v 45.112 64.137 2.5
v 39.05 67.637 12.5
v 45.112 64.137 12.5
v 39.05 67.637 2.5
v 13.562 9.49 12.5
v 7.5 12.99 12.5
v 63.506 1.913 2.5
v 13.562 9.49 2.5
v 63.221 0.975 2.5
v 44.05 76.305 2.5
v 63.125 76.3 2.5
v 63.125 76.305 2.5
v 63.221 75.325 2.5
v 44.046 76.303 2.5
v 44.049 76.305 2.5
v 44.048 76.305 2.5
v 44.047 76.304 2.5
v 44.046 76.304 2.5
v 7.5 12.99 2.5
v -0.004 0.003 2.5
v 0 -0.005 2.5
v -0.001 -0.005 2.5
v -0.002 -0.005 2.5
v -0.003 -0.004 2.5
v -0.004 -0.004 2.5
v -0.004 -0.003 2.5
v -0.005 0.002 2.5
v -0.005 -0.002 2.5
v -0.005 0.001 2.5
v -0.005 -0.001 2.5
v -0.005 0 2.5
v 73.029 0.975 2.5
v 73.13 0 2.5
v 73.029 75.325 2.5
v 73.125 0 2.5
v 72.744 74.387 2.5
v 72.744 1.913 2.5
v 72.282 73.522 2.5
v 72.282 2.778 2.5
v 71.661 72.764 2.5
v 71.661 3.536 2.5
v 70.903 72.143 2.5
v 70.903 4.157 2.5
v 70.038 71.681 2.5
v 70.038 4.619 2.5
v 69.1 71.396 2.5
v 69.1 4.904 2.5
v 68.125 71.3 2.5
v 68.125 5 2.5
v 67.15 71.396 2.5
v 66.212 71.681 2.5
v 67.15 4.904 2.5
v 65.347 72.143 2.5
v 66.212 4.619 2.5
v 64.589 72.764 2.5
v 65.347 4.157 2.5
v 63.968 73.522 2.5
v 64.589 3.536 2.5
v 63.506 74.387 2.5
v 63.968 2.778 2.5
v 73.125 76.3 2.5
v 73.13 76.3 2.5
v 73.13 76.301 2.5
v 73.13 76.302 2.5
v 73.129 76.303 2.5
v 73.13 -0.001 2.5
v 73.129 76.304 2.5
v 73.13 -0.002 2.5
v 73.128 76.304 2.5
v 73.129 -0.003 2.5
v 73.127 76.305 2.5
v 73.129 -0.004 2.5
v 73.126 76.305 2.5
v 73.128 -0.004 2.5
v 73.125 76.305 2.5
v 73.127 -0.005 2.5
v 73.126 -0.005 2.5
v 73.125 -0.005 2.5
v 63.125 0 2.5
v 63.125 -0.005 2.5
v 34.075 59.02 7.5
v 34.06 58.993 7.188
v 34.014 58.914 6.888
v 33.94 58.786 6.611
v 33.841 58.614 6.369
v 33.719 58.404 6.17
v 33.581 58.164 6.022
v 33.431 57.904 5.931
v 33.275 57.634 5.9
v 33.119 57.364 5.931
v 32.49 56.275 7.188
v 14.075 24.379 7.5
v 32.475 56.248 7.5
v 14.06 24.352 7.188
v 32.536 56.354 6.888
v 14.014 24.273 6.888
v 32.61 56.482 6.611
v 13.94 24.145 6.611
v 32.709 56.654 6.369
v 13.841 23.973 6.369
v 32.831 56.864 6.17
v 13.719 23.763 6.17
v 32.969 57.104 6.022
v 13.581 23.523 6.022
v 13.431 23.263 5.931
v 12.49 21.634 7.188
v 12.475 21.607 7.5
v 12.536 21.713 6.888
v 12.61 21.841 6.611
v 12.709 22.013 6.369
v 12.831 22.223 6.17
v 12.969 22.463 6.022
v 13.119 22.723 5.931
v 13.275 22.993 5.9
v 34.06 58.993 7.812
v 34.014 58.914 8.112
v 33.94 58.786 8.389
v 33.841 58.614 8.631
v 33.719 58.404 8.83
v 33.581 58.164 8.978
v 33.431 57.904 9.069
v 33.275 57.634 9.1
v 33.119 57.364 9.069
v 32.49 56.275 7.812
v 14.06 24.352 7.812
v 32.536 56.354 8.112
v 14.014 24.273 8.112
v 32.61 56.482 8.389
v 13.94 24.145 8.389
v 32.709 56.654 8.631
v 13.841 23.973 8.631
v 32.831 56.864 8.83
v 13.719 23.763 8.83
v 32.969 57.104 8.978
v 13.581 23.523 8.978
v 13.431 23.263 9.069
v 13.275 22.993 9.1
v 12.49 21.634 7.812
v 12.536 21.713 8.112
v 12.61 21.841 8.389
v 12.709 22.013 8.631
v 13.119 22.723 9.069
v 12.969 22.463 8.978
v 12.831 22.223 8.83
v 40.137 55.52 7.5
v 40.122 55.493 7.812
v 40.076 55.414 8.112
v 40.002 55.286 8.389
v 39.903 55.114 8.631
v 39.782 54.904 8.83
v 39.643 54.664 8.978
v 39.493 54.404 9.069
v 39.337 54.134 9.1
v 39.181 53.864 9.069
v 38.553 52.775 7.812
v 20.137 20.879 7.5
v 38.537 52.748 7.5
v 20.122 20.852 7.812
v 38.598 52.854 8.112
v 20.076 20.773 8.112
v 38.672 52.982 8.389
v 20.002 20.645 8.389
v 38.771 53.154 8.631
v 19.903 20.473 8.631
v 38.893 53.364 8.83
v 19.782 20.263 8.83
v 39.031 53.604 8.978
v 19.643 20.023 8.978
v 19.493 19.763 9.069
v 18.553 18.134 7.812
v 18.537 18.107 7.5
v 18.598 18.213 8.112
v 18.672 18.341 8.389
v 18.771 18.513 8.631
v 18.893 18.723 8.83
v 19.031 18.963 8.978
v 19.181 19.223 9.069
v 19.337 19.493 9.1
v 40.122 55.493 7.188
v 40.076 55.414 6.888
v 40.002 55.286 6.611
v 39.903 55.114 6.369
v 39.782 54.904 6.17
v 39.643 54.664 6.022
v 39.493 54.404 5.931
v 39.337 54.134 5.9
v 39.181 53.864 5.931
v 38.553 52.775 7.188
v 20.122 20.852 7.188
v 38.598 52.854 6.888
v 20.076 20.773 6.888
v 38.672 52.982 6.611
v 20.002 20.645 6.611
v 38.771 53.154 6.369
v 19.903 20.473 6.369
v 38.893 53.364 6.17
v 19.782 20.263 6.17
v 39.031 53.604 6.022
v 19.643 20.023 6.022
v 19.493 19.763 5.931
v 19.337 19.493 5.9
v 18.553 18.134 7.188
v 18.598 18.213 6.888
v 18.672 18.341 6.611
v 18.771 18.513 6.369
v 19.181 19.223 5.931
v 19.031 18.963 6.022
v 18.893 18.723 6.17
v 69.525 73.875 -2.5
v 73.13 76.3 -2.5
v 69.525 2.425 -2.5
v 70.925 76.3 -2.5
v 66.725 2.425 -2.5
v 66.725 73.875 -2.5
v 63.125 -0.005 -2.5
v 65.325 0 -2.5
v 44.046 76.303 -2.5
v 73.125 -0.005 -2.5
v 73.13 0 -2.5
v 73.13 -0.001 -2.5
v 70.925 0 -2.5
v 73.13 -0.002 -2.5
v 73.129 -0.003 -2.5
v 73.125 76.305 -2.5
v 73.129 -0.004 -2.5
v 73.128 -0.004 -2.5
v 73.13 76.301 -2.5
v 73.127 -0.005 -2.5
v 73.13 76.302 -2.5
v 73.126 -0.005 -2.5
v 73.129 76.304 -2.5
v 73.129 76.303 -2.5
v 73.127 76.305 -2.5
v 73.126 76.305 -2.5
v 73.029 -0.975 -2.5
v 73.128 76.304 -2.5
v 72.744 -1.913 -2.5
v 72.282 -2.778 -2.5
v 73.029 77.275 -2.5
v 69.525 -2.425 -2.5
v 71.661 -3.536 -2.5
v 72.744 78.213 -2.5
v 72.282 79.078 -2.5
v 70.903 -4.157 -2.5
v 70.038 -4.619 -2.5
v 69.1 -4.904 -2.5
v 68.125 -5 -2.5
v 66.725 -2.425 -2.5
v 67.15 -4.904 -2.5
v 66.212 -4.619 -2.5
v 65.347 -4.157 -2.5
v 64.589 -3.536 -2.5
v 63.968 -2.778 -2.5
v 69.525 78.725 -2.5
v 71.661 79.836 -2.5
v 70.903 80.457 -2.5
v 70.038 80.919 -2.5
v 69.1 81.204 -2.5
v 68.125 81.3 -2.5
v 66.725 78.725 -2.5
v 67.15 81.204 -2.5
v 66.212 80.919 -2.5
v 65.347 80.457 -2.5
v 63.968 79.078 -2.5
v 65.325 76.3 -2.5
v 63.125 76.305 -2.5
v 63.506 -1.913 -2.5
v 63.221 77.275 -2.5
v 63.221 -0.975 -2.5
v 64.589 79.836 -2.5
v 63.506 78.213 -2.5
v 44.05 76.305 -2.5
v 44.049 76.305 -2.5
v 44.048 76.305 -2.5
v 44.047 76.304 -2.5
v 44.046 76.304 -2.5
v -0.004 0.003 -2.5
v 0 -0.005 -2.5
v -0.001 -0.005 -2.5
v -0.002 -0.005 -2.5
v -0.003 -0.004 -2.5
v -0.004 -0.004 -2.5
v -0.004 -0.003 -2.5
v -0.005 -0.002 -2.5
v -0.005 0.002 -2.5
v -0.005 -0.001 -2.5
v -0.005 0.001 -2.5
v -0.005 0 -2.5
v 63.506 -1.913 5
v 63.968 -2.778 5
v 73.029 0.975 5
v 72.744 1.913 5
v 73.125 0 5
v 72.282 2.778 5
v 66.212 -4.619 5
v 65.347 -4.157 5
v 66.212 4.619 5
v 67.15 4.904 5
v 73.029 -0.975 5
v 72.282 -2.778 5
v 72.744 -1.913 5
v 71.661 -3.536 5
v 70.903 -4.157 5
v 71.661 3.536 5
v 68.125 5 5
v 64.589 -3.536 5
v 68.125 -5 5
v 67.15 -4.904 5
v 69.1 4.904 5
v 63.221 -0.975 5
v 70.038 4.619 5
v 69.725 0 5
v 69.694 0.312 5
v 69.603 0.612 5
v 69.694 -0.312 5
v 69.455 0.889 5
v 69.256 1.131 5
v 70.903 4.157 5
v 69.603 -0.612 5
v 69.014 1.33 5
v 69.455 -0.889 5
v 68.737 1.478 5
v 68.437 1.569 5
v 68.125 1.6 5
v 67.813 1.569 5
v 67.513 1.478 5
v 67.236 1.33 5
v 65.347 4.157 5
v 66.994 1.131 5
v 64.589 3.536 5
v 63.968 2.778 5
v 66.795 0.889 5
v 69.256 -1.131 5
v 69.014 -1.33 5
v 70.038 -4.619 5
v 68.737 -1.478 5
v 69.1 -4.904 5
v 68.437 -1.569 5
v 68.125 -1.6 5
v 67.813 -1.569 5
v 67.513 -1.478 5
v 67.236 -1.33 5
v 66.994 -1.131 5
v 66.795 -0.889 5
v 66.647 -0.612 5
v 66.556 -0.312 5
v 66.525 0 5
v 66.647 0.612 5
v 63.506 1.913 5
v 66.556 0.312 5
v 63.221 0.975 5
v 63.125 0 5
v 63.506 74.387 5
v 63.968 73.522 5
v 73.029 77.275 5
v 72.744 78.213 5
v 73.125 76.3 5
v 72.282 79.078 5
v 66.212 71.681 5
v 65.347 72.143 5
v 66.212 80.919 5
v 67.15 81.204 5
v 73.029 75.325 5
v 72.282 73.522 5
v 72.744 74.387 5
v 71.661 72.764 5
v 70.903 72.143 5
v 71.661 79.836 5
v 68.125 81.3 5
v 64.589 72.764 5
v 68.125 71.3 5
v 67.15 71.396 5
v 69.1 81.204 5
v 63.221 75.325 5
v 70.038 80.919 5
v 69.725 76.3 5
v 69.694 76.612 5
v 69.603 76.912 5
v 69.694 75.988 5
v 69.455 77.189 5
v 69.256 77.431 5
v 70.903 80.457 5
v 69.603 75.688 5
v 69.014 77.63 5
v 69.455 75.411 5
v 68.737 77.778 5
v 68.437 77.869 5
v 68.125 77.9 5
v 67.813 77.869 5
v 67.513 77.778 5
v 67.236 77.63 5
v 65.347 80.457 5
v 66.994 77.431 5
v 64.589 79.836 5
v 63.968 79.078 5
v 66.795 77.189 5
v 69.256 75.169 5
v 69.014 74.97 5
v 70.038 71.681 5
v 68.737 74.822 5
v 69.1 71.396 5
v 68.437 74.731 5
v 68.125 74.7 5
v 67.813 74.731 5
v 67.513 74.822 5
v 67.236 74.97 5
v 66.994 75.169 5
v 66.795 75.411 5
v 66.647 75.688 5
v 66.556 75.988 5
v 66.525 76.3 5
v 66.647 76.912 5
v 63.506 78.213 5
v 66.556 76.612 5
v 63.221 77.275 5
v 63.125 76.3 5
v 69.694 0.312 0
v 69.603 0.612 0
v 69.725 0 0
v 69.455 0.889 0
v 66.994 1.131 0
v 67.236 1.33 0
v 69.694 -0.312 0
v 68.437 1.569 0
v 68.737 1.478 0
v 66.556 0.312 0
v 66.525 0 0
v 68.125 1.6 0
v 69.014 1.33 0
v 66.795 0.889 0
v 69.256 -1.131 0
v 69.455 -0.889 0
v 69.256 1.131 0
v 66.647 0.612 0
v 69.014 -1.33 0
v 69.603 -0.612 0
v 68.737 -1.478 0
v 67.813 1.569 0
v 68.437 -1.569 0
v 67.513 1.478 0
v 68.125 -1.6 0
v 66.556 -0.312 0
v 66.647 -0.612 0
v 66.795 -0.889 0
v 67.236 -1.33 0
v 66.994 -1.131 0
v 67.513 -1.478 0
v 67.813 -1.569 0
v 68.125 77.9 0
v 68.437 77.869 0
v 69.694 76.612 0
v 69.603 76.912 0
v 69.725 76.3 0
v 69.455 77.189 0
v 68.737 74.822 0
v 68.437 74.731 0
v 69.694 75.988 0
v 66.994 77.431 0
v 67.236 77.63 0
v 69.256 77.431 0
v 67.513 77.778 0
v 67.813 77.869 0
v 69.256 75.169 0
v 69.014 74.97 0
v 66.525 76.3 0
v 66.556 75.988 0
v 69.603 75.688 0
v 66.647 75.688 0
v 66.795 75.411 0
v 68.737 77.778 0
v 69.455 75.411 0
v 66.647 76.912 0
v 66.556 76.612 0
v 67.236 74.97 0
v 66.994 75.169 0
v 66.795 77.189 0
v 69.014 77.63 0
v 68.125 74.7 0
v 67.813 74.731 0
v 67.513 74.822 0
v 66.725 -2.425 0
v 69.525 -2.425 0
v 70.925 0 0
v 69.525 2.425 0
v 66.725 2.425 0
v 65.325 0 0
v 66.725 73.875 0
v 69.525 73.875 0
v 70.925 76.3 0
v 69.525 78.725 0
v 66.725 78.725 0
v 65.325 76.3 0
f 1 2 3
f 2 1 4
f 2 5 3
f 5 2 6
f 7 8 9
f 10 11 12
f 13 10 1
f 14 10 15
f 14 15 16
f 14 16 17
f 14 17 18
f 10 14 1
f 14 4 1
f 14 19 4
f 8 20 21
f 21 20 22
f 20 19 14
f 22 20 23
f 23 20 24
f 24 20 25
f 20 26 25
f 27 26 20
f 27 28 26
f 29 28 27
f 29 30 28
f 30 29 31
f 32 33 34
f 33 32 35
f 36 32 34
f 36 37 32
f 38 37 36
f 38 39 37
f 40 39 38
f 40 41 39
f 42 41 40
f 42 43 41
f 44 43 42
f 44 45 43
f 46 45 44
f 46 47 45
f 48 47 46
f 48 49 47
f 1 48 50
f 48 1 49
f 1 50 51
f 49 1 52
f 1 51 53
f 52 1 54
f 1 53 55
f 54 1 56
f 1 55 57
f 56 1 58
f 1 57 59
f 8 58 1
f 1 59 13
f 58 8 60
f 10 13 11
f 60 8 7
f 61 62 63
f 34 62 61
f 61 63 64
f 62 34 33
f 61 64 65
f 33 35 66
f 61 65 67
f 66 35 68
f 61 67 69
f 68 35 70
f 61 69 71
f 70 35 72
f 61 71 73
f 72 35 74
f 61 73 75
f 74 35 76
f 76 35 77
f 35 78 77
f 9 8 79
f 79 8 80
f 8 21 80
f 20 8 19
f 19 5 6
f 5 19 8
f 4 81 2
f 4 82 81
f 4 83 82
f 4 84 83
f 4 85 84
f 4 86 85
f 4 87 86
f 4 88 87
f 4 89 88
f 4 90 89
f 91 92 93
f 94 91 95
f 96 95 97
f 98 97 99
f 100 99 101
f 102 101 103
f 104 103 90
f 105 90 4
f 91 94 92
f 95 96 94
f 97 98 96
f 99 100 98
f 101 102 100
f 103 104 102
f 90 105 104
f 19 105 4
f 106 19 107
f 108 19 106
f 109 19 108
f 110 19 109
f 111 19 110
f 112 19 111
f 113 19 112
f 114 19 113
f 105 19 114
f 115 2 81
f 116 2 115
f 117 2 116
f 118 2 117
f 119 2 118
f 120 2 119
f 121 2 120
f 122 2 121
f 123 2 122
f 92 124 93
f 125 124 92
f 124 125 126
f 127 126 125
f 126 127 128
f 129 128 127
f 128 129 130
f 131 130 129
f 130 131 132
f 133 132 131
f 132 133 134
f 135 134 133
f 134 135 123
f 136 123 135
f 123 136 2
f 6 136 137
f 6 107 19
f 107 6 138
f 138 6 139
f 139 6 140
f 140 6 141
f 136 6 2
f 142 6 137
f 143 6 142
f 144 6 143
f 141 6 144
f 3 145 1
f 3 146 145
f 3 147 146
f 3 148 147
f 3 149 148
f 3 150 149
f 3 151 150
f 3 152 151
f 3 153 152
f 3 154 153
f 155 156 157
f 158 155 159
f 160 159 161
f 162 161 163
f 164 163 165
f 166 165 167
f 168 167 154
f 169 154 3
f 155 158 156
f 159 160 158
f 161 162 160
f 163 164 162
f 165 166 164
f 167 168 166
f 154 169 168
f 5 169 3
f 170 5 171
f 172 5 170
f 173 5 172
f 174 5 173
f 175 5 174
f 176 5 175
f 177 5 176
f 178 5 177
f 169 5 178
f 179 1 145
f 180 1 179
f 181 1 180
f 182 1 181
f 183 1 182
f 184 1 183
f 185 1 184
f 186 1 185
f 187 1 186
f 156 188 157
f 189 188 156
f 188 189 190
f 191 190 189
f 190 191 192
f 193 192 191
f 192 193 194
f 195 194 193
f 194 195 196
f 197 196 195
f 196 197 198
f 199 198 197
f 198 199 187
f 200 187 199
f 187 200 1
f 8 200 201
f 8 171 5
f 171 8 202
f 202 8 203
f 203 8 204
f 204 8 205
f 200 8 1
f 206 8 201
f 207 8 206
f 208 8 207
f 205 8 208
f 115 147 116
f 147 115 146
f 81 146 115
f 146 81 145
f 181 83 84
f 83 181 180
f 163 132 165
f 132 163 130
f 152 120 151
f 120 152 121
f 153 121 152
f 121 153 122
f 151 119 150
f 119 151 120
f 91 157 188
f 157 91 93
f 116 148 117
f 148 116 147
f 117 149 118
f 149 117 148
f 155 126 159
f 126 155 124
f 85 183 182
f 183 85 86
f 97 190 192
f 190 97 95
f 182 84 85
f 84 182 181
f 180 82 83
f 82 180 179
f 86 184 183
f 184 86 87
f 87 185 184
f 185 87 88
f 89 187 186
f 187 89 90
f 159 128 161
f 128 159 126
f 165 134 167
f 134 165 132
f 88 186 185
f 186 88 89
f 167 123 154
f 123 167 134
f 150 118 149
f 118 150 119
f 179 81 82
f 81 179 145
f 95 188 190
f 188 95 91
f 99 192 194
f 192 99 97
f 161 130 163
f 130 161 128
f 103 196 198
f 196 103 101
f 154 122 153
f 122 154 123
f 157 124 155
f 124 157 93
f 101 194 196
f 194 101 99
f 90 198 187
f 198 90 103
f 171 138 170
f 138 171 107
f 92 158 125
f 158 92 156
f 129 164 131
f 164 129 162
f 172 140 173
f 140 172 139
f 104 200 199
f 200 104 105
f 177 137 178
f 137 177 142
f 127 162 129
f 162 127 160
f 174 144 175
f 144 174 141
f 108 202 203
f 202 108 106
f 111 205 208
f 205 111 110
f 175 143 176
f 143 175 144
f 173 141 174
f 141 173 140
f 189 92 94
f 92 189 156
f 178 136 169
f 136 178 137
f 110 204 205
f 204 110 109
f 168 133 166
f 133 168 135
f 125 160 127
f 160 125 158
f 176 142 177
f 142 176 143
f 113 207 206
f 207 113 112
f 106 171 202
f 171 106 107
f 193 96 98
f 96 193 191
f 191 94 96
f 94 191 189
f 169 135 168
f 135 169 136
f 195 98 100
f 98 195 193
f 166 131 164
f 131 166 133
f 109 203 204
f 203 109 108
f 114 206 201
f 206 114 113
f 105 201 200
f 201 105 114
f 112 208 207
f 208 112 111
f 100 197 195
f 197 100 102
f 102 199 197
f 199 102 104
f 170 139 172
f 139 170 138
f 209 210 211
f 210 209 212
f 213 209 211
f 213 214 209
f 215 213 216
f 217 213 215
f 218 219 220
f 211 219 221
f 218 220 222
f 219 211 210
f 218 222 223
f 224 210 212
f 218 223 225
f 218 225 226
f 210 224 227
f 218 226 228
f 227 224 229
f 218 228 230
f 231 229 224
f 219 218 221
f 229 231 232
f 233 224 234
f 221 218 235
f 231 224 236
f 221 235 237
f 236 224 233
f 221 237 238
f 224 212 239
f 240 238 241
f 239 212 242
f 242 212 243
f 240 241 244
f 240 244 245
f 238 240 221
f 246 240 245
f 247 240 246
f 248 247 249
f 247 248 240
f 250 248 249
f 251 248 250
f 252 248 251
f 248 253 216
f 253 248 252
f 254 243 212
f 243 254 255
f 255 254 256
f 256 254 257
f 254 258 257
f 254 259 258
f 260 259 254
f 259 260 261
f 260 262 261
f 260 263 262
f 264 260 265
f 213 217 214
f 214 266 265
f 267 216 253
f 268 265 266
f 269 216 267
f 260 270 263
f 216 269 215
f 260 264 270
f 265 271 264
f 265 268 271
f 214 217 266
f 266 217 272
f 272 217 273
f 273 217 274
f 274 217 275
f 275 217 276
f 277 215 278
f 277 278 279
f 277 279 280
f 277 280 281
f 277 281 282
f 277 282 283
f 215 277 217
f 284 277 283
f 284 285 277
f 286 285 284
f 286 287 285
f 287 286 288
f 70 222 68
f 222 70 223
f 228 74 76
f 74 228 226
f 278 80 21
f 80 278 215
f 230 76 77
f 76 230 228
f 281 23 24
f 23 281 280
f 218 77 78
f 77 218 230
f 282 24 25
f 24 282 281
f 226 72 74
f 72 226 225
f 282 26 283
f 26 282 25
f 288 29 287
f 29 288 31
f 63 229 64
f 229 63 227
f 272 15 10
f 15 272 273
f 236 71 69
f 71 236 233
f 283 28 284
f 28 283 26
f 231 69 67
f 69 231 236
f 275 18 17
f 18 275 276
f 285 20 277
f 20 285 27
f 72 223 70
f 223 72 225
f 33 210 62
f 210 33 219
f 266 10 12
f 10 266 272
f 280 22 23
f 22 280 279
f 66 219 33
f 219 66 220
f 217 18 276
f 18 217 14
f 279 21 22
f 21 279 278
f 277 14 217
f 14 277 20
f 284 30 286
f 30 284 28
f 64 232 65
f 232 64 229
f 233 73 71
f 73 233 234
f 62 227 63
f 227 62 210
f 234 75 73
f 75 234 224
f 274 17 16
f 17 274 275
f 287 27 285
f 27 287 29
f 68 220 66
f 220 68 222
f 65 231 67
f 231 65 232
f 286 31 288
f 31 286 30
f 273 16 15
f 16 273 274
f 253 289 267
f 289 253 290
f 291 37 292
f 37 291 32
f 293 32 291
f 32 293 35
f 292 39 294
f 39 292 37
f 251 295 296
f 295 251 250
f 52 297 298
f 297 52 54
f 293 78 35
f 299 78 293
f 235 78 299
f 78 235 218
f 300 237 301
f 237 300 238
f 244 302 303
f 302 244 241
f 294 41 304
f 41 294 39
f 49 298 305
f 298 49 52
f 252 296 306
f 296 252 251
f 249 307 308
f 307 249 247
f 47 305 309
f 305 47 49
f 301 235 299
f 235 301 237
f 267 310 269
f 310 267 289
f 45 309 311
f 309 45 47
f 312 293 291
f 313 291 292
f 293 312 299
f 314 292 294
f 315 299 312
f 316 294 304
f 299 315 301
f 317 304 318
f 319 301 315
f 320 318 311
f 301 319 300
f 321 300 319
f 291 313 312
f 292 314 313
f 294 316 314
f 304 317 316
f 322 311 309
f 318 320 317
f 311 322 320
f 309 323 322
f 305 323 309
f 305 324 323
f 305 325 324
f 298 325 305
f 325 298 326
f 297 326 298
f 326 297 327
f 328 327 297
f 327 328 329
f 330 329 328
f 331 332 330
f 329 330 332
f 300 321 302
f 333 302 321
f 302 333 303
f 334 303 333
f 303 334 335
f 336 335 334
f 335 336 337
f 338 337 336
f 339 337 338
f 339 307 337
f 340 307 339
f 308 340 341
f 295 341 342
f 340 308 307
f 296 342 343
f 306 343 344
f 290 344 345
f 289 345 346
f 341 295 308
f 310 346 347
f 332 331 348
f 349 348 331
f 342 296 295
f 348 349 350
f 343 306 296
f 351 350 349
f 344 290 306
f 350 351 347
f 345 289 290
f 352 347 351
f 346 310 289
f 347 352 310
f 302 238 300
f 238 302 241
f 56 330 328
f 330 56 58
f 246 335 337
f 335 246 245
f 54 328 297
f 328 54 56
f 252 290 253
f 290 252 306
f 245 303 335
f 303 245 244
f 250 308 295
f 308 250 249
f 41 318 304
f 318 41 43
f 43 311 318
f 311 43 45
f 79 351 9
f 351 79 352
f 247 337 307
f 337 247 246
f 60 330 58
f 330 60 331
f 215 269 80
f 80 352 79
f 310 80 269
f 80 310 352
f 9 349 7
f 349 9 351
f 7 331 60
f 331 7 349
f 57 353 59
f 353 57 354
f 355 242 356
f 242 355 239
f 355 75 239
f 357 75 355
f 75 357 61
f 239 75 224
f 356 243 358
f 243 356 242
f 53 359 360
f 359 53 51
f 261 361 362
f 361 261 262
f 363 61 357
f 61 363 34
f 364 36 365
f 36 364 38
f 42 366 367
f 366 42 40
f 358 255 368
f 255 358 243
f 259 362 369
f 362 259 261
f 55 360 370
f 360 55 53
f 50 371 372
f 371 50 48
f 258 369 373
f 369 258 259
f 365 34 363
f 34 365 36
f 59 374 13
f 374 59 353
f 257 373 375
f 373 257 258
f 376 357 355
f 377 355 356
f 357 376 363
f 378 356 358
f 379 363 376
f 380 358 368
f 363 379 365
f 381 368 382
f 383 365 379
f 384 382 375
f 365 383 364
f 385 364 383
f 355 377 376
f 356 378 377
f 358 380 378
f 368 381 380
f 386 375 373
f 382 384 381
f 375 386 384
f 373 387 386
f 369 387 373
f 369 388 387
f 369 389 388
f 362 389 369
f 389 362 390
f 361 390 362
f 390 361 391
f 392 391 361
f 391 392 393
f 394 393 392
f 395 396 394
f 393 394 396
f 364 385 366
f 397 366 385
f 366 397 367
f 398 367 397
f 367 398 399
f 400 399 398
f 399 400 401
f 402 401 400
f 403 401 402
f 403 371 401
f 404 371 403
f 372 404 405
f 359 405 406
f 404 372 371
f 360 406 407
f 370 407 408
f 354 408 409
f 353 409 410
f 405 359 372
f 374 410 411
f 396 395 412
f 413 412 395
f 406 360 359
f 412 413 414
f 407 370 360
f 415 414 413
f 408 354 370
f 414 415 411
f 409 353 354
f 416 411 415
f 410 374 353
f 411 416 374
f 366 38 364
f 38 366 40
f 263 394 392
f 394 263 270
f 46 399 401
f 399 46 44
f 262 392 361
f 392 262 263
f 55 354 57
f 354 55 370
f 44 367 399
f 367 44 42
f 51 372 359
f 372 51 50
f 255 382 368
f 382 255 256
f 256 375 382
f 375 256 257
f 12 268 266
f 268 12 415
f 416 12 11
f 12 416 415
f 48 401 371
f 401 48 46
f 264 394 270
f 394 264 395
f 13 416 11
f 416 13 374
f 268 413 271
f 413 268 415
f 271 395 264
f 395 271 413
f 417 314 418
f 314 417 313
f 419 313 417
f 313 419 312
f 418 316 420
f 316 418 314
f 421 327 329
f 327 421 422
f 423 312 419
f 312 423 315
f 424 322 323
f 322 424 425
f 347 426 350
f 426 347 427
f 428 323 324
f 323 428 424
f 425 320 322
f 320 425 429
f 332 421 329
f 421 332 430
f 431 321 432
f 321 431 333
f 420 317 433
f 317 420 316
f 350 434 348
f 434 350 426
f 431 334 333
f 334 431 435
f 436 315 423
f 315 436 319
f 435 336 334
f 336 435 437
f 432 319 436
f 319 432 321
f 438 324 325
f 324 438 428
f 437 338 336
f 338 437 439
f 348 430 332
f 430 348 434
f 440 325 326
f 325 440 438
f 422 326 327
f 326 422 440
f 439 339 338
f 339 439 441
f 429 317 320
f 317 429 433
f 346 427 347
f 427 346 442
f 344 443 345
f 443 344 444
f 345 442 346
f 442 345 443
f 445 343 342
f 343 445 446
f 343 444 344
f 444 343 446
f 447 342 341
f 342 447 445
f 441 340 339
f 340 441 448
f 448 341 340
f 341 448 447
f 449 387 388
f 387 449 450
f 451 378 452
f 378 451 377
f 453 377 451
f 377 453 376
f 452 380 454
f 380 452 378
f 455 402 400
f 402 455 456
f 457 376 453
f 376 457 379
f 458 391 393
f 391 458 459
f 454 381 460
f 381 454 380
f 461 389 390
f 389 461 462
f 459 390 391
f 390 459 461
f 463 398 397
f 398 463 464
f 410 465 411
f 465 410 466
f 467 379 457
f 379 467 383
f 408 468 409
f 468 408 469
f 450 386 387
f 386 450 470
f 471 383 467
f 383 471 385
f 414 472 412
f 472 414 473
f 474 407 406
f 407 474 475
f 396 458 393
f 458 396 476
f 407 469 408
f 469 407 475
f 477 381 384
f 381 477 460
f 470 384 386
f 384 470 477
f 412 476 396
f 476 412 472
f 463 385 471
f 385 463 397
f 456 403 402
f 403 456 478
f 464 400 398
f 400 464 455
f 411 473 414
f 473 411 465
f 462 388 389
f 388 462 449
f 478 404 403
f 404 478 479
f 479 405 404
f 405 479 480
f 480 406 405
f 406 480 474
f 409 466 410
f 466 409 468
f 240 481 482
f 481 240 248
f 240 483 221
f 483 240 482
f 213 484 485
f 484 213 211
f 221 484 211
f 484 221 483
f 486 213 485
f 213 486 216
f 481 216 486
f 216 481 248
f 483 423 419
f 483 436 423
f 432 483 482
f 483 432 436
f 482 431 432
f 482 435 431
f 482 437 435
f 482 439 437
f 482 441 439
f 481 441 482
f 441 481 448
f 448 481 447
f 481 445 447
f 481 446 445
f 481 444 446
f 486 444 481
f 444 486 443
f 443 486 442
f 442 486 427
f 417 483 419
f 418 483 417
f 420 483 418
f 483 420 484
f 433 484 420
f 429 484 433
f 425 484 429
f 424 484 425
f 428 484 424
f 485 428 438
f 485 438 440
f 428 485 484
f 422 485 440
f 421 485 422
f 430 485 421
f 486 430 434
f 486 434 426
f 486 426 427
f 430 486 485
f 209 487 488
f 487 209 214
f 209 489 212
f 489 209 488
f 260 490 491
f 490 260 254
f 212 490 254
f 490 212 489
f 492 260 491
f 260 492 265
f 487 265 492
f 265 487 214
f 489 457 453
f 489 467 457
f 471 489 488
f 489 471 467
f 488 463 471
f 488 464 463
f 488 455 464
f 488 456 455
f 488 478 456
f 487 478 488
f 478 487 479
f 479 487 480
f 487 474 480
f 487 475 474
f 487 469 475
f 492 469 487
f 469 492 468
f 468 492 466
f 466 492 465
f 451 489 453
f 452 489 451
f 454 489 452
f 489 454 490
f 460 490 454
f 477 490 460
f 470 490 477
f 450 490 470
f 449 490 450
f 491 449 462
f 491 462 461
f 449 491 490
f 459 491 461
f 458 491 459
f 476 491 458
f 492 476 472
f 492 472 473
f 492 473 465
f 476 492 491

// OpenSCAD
$fn=32;

// trapezoid size
a_l = 68.125;
b_l = 24.1;
c_l = 83.1;
d_l = 76.3;

// points
a = [0,0,0];
b = [68.125,0,0];
c = [68.125,76.3,0];
d = [44.05,76.3,0];

h = 5;
w = 7;
c_d = 0.01;

difference(){
    union(){
        hull(){
            cylinder(d=0.01, h=h, center=true);
            translate([a_l+5,0,0])
                cylinder(d=c_d, h=h, center=true);
            translate([a_l+5,d_l])
                cylinder(d=c_d, h=h, center=true);
            translate(d)
                cylinder(d=c_d, h=h, center=true);
        }
        translate([68.125,0,2.5/2])
            cylinder(d=10, h=h+2.5, center=true);
        translate([68.125,76.3,2.5/2])
            cylinder(d=10, h=h+2.5, center=true);
        rotate([0,0,60])
        translate([c_l/2+5,-w/2,h+5/2])
            difference(){
                cube([c_l-20,w,h+5], center=true);
                rotate([90,0,0])
                translate([20,0,0])
                    cylinder(d = 3.2, h = w*2, center = true);
                rotate([90,0,0])
                translate([-20,0,0])
                    cylinder(d = 3.2, h = w*2, center = true);
            }
    }
    // Screw holes
    translate(b)
        cylinder(d=3.2, h=h*3, center=true);
    translate(c)
        cylinder(d=3.2, h=h*3, center=true);
    // Nut sockets
    translate([68.125,0,-h/2])
        cylinder($fn=6, d=5.6, h=5, center=true);
    translate([68.125,76.3,-h/2])
        cylinder($fn=6, d=5.6, h=5, center=true);
    /* hull(){
        translate([10,5,0])
            cylinder(d=0.01, h=h, center=true);
        translate([a_l-5,5,0])
            cylinder(d=c_d, h=h, center=true);
        translate([a_l-5,d_l-5,0])
            cylinder(d=c_d, h=h, center=true);
        translate([44.05+5,76.3-5,0])
            cylinder(d=c_d, h=h+1, center=true);
    } */
}
